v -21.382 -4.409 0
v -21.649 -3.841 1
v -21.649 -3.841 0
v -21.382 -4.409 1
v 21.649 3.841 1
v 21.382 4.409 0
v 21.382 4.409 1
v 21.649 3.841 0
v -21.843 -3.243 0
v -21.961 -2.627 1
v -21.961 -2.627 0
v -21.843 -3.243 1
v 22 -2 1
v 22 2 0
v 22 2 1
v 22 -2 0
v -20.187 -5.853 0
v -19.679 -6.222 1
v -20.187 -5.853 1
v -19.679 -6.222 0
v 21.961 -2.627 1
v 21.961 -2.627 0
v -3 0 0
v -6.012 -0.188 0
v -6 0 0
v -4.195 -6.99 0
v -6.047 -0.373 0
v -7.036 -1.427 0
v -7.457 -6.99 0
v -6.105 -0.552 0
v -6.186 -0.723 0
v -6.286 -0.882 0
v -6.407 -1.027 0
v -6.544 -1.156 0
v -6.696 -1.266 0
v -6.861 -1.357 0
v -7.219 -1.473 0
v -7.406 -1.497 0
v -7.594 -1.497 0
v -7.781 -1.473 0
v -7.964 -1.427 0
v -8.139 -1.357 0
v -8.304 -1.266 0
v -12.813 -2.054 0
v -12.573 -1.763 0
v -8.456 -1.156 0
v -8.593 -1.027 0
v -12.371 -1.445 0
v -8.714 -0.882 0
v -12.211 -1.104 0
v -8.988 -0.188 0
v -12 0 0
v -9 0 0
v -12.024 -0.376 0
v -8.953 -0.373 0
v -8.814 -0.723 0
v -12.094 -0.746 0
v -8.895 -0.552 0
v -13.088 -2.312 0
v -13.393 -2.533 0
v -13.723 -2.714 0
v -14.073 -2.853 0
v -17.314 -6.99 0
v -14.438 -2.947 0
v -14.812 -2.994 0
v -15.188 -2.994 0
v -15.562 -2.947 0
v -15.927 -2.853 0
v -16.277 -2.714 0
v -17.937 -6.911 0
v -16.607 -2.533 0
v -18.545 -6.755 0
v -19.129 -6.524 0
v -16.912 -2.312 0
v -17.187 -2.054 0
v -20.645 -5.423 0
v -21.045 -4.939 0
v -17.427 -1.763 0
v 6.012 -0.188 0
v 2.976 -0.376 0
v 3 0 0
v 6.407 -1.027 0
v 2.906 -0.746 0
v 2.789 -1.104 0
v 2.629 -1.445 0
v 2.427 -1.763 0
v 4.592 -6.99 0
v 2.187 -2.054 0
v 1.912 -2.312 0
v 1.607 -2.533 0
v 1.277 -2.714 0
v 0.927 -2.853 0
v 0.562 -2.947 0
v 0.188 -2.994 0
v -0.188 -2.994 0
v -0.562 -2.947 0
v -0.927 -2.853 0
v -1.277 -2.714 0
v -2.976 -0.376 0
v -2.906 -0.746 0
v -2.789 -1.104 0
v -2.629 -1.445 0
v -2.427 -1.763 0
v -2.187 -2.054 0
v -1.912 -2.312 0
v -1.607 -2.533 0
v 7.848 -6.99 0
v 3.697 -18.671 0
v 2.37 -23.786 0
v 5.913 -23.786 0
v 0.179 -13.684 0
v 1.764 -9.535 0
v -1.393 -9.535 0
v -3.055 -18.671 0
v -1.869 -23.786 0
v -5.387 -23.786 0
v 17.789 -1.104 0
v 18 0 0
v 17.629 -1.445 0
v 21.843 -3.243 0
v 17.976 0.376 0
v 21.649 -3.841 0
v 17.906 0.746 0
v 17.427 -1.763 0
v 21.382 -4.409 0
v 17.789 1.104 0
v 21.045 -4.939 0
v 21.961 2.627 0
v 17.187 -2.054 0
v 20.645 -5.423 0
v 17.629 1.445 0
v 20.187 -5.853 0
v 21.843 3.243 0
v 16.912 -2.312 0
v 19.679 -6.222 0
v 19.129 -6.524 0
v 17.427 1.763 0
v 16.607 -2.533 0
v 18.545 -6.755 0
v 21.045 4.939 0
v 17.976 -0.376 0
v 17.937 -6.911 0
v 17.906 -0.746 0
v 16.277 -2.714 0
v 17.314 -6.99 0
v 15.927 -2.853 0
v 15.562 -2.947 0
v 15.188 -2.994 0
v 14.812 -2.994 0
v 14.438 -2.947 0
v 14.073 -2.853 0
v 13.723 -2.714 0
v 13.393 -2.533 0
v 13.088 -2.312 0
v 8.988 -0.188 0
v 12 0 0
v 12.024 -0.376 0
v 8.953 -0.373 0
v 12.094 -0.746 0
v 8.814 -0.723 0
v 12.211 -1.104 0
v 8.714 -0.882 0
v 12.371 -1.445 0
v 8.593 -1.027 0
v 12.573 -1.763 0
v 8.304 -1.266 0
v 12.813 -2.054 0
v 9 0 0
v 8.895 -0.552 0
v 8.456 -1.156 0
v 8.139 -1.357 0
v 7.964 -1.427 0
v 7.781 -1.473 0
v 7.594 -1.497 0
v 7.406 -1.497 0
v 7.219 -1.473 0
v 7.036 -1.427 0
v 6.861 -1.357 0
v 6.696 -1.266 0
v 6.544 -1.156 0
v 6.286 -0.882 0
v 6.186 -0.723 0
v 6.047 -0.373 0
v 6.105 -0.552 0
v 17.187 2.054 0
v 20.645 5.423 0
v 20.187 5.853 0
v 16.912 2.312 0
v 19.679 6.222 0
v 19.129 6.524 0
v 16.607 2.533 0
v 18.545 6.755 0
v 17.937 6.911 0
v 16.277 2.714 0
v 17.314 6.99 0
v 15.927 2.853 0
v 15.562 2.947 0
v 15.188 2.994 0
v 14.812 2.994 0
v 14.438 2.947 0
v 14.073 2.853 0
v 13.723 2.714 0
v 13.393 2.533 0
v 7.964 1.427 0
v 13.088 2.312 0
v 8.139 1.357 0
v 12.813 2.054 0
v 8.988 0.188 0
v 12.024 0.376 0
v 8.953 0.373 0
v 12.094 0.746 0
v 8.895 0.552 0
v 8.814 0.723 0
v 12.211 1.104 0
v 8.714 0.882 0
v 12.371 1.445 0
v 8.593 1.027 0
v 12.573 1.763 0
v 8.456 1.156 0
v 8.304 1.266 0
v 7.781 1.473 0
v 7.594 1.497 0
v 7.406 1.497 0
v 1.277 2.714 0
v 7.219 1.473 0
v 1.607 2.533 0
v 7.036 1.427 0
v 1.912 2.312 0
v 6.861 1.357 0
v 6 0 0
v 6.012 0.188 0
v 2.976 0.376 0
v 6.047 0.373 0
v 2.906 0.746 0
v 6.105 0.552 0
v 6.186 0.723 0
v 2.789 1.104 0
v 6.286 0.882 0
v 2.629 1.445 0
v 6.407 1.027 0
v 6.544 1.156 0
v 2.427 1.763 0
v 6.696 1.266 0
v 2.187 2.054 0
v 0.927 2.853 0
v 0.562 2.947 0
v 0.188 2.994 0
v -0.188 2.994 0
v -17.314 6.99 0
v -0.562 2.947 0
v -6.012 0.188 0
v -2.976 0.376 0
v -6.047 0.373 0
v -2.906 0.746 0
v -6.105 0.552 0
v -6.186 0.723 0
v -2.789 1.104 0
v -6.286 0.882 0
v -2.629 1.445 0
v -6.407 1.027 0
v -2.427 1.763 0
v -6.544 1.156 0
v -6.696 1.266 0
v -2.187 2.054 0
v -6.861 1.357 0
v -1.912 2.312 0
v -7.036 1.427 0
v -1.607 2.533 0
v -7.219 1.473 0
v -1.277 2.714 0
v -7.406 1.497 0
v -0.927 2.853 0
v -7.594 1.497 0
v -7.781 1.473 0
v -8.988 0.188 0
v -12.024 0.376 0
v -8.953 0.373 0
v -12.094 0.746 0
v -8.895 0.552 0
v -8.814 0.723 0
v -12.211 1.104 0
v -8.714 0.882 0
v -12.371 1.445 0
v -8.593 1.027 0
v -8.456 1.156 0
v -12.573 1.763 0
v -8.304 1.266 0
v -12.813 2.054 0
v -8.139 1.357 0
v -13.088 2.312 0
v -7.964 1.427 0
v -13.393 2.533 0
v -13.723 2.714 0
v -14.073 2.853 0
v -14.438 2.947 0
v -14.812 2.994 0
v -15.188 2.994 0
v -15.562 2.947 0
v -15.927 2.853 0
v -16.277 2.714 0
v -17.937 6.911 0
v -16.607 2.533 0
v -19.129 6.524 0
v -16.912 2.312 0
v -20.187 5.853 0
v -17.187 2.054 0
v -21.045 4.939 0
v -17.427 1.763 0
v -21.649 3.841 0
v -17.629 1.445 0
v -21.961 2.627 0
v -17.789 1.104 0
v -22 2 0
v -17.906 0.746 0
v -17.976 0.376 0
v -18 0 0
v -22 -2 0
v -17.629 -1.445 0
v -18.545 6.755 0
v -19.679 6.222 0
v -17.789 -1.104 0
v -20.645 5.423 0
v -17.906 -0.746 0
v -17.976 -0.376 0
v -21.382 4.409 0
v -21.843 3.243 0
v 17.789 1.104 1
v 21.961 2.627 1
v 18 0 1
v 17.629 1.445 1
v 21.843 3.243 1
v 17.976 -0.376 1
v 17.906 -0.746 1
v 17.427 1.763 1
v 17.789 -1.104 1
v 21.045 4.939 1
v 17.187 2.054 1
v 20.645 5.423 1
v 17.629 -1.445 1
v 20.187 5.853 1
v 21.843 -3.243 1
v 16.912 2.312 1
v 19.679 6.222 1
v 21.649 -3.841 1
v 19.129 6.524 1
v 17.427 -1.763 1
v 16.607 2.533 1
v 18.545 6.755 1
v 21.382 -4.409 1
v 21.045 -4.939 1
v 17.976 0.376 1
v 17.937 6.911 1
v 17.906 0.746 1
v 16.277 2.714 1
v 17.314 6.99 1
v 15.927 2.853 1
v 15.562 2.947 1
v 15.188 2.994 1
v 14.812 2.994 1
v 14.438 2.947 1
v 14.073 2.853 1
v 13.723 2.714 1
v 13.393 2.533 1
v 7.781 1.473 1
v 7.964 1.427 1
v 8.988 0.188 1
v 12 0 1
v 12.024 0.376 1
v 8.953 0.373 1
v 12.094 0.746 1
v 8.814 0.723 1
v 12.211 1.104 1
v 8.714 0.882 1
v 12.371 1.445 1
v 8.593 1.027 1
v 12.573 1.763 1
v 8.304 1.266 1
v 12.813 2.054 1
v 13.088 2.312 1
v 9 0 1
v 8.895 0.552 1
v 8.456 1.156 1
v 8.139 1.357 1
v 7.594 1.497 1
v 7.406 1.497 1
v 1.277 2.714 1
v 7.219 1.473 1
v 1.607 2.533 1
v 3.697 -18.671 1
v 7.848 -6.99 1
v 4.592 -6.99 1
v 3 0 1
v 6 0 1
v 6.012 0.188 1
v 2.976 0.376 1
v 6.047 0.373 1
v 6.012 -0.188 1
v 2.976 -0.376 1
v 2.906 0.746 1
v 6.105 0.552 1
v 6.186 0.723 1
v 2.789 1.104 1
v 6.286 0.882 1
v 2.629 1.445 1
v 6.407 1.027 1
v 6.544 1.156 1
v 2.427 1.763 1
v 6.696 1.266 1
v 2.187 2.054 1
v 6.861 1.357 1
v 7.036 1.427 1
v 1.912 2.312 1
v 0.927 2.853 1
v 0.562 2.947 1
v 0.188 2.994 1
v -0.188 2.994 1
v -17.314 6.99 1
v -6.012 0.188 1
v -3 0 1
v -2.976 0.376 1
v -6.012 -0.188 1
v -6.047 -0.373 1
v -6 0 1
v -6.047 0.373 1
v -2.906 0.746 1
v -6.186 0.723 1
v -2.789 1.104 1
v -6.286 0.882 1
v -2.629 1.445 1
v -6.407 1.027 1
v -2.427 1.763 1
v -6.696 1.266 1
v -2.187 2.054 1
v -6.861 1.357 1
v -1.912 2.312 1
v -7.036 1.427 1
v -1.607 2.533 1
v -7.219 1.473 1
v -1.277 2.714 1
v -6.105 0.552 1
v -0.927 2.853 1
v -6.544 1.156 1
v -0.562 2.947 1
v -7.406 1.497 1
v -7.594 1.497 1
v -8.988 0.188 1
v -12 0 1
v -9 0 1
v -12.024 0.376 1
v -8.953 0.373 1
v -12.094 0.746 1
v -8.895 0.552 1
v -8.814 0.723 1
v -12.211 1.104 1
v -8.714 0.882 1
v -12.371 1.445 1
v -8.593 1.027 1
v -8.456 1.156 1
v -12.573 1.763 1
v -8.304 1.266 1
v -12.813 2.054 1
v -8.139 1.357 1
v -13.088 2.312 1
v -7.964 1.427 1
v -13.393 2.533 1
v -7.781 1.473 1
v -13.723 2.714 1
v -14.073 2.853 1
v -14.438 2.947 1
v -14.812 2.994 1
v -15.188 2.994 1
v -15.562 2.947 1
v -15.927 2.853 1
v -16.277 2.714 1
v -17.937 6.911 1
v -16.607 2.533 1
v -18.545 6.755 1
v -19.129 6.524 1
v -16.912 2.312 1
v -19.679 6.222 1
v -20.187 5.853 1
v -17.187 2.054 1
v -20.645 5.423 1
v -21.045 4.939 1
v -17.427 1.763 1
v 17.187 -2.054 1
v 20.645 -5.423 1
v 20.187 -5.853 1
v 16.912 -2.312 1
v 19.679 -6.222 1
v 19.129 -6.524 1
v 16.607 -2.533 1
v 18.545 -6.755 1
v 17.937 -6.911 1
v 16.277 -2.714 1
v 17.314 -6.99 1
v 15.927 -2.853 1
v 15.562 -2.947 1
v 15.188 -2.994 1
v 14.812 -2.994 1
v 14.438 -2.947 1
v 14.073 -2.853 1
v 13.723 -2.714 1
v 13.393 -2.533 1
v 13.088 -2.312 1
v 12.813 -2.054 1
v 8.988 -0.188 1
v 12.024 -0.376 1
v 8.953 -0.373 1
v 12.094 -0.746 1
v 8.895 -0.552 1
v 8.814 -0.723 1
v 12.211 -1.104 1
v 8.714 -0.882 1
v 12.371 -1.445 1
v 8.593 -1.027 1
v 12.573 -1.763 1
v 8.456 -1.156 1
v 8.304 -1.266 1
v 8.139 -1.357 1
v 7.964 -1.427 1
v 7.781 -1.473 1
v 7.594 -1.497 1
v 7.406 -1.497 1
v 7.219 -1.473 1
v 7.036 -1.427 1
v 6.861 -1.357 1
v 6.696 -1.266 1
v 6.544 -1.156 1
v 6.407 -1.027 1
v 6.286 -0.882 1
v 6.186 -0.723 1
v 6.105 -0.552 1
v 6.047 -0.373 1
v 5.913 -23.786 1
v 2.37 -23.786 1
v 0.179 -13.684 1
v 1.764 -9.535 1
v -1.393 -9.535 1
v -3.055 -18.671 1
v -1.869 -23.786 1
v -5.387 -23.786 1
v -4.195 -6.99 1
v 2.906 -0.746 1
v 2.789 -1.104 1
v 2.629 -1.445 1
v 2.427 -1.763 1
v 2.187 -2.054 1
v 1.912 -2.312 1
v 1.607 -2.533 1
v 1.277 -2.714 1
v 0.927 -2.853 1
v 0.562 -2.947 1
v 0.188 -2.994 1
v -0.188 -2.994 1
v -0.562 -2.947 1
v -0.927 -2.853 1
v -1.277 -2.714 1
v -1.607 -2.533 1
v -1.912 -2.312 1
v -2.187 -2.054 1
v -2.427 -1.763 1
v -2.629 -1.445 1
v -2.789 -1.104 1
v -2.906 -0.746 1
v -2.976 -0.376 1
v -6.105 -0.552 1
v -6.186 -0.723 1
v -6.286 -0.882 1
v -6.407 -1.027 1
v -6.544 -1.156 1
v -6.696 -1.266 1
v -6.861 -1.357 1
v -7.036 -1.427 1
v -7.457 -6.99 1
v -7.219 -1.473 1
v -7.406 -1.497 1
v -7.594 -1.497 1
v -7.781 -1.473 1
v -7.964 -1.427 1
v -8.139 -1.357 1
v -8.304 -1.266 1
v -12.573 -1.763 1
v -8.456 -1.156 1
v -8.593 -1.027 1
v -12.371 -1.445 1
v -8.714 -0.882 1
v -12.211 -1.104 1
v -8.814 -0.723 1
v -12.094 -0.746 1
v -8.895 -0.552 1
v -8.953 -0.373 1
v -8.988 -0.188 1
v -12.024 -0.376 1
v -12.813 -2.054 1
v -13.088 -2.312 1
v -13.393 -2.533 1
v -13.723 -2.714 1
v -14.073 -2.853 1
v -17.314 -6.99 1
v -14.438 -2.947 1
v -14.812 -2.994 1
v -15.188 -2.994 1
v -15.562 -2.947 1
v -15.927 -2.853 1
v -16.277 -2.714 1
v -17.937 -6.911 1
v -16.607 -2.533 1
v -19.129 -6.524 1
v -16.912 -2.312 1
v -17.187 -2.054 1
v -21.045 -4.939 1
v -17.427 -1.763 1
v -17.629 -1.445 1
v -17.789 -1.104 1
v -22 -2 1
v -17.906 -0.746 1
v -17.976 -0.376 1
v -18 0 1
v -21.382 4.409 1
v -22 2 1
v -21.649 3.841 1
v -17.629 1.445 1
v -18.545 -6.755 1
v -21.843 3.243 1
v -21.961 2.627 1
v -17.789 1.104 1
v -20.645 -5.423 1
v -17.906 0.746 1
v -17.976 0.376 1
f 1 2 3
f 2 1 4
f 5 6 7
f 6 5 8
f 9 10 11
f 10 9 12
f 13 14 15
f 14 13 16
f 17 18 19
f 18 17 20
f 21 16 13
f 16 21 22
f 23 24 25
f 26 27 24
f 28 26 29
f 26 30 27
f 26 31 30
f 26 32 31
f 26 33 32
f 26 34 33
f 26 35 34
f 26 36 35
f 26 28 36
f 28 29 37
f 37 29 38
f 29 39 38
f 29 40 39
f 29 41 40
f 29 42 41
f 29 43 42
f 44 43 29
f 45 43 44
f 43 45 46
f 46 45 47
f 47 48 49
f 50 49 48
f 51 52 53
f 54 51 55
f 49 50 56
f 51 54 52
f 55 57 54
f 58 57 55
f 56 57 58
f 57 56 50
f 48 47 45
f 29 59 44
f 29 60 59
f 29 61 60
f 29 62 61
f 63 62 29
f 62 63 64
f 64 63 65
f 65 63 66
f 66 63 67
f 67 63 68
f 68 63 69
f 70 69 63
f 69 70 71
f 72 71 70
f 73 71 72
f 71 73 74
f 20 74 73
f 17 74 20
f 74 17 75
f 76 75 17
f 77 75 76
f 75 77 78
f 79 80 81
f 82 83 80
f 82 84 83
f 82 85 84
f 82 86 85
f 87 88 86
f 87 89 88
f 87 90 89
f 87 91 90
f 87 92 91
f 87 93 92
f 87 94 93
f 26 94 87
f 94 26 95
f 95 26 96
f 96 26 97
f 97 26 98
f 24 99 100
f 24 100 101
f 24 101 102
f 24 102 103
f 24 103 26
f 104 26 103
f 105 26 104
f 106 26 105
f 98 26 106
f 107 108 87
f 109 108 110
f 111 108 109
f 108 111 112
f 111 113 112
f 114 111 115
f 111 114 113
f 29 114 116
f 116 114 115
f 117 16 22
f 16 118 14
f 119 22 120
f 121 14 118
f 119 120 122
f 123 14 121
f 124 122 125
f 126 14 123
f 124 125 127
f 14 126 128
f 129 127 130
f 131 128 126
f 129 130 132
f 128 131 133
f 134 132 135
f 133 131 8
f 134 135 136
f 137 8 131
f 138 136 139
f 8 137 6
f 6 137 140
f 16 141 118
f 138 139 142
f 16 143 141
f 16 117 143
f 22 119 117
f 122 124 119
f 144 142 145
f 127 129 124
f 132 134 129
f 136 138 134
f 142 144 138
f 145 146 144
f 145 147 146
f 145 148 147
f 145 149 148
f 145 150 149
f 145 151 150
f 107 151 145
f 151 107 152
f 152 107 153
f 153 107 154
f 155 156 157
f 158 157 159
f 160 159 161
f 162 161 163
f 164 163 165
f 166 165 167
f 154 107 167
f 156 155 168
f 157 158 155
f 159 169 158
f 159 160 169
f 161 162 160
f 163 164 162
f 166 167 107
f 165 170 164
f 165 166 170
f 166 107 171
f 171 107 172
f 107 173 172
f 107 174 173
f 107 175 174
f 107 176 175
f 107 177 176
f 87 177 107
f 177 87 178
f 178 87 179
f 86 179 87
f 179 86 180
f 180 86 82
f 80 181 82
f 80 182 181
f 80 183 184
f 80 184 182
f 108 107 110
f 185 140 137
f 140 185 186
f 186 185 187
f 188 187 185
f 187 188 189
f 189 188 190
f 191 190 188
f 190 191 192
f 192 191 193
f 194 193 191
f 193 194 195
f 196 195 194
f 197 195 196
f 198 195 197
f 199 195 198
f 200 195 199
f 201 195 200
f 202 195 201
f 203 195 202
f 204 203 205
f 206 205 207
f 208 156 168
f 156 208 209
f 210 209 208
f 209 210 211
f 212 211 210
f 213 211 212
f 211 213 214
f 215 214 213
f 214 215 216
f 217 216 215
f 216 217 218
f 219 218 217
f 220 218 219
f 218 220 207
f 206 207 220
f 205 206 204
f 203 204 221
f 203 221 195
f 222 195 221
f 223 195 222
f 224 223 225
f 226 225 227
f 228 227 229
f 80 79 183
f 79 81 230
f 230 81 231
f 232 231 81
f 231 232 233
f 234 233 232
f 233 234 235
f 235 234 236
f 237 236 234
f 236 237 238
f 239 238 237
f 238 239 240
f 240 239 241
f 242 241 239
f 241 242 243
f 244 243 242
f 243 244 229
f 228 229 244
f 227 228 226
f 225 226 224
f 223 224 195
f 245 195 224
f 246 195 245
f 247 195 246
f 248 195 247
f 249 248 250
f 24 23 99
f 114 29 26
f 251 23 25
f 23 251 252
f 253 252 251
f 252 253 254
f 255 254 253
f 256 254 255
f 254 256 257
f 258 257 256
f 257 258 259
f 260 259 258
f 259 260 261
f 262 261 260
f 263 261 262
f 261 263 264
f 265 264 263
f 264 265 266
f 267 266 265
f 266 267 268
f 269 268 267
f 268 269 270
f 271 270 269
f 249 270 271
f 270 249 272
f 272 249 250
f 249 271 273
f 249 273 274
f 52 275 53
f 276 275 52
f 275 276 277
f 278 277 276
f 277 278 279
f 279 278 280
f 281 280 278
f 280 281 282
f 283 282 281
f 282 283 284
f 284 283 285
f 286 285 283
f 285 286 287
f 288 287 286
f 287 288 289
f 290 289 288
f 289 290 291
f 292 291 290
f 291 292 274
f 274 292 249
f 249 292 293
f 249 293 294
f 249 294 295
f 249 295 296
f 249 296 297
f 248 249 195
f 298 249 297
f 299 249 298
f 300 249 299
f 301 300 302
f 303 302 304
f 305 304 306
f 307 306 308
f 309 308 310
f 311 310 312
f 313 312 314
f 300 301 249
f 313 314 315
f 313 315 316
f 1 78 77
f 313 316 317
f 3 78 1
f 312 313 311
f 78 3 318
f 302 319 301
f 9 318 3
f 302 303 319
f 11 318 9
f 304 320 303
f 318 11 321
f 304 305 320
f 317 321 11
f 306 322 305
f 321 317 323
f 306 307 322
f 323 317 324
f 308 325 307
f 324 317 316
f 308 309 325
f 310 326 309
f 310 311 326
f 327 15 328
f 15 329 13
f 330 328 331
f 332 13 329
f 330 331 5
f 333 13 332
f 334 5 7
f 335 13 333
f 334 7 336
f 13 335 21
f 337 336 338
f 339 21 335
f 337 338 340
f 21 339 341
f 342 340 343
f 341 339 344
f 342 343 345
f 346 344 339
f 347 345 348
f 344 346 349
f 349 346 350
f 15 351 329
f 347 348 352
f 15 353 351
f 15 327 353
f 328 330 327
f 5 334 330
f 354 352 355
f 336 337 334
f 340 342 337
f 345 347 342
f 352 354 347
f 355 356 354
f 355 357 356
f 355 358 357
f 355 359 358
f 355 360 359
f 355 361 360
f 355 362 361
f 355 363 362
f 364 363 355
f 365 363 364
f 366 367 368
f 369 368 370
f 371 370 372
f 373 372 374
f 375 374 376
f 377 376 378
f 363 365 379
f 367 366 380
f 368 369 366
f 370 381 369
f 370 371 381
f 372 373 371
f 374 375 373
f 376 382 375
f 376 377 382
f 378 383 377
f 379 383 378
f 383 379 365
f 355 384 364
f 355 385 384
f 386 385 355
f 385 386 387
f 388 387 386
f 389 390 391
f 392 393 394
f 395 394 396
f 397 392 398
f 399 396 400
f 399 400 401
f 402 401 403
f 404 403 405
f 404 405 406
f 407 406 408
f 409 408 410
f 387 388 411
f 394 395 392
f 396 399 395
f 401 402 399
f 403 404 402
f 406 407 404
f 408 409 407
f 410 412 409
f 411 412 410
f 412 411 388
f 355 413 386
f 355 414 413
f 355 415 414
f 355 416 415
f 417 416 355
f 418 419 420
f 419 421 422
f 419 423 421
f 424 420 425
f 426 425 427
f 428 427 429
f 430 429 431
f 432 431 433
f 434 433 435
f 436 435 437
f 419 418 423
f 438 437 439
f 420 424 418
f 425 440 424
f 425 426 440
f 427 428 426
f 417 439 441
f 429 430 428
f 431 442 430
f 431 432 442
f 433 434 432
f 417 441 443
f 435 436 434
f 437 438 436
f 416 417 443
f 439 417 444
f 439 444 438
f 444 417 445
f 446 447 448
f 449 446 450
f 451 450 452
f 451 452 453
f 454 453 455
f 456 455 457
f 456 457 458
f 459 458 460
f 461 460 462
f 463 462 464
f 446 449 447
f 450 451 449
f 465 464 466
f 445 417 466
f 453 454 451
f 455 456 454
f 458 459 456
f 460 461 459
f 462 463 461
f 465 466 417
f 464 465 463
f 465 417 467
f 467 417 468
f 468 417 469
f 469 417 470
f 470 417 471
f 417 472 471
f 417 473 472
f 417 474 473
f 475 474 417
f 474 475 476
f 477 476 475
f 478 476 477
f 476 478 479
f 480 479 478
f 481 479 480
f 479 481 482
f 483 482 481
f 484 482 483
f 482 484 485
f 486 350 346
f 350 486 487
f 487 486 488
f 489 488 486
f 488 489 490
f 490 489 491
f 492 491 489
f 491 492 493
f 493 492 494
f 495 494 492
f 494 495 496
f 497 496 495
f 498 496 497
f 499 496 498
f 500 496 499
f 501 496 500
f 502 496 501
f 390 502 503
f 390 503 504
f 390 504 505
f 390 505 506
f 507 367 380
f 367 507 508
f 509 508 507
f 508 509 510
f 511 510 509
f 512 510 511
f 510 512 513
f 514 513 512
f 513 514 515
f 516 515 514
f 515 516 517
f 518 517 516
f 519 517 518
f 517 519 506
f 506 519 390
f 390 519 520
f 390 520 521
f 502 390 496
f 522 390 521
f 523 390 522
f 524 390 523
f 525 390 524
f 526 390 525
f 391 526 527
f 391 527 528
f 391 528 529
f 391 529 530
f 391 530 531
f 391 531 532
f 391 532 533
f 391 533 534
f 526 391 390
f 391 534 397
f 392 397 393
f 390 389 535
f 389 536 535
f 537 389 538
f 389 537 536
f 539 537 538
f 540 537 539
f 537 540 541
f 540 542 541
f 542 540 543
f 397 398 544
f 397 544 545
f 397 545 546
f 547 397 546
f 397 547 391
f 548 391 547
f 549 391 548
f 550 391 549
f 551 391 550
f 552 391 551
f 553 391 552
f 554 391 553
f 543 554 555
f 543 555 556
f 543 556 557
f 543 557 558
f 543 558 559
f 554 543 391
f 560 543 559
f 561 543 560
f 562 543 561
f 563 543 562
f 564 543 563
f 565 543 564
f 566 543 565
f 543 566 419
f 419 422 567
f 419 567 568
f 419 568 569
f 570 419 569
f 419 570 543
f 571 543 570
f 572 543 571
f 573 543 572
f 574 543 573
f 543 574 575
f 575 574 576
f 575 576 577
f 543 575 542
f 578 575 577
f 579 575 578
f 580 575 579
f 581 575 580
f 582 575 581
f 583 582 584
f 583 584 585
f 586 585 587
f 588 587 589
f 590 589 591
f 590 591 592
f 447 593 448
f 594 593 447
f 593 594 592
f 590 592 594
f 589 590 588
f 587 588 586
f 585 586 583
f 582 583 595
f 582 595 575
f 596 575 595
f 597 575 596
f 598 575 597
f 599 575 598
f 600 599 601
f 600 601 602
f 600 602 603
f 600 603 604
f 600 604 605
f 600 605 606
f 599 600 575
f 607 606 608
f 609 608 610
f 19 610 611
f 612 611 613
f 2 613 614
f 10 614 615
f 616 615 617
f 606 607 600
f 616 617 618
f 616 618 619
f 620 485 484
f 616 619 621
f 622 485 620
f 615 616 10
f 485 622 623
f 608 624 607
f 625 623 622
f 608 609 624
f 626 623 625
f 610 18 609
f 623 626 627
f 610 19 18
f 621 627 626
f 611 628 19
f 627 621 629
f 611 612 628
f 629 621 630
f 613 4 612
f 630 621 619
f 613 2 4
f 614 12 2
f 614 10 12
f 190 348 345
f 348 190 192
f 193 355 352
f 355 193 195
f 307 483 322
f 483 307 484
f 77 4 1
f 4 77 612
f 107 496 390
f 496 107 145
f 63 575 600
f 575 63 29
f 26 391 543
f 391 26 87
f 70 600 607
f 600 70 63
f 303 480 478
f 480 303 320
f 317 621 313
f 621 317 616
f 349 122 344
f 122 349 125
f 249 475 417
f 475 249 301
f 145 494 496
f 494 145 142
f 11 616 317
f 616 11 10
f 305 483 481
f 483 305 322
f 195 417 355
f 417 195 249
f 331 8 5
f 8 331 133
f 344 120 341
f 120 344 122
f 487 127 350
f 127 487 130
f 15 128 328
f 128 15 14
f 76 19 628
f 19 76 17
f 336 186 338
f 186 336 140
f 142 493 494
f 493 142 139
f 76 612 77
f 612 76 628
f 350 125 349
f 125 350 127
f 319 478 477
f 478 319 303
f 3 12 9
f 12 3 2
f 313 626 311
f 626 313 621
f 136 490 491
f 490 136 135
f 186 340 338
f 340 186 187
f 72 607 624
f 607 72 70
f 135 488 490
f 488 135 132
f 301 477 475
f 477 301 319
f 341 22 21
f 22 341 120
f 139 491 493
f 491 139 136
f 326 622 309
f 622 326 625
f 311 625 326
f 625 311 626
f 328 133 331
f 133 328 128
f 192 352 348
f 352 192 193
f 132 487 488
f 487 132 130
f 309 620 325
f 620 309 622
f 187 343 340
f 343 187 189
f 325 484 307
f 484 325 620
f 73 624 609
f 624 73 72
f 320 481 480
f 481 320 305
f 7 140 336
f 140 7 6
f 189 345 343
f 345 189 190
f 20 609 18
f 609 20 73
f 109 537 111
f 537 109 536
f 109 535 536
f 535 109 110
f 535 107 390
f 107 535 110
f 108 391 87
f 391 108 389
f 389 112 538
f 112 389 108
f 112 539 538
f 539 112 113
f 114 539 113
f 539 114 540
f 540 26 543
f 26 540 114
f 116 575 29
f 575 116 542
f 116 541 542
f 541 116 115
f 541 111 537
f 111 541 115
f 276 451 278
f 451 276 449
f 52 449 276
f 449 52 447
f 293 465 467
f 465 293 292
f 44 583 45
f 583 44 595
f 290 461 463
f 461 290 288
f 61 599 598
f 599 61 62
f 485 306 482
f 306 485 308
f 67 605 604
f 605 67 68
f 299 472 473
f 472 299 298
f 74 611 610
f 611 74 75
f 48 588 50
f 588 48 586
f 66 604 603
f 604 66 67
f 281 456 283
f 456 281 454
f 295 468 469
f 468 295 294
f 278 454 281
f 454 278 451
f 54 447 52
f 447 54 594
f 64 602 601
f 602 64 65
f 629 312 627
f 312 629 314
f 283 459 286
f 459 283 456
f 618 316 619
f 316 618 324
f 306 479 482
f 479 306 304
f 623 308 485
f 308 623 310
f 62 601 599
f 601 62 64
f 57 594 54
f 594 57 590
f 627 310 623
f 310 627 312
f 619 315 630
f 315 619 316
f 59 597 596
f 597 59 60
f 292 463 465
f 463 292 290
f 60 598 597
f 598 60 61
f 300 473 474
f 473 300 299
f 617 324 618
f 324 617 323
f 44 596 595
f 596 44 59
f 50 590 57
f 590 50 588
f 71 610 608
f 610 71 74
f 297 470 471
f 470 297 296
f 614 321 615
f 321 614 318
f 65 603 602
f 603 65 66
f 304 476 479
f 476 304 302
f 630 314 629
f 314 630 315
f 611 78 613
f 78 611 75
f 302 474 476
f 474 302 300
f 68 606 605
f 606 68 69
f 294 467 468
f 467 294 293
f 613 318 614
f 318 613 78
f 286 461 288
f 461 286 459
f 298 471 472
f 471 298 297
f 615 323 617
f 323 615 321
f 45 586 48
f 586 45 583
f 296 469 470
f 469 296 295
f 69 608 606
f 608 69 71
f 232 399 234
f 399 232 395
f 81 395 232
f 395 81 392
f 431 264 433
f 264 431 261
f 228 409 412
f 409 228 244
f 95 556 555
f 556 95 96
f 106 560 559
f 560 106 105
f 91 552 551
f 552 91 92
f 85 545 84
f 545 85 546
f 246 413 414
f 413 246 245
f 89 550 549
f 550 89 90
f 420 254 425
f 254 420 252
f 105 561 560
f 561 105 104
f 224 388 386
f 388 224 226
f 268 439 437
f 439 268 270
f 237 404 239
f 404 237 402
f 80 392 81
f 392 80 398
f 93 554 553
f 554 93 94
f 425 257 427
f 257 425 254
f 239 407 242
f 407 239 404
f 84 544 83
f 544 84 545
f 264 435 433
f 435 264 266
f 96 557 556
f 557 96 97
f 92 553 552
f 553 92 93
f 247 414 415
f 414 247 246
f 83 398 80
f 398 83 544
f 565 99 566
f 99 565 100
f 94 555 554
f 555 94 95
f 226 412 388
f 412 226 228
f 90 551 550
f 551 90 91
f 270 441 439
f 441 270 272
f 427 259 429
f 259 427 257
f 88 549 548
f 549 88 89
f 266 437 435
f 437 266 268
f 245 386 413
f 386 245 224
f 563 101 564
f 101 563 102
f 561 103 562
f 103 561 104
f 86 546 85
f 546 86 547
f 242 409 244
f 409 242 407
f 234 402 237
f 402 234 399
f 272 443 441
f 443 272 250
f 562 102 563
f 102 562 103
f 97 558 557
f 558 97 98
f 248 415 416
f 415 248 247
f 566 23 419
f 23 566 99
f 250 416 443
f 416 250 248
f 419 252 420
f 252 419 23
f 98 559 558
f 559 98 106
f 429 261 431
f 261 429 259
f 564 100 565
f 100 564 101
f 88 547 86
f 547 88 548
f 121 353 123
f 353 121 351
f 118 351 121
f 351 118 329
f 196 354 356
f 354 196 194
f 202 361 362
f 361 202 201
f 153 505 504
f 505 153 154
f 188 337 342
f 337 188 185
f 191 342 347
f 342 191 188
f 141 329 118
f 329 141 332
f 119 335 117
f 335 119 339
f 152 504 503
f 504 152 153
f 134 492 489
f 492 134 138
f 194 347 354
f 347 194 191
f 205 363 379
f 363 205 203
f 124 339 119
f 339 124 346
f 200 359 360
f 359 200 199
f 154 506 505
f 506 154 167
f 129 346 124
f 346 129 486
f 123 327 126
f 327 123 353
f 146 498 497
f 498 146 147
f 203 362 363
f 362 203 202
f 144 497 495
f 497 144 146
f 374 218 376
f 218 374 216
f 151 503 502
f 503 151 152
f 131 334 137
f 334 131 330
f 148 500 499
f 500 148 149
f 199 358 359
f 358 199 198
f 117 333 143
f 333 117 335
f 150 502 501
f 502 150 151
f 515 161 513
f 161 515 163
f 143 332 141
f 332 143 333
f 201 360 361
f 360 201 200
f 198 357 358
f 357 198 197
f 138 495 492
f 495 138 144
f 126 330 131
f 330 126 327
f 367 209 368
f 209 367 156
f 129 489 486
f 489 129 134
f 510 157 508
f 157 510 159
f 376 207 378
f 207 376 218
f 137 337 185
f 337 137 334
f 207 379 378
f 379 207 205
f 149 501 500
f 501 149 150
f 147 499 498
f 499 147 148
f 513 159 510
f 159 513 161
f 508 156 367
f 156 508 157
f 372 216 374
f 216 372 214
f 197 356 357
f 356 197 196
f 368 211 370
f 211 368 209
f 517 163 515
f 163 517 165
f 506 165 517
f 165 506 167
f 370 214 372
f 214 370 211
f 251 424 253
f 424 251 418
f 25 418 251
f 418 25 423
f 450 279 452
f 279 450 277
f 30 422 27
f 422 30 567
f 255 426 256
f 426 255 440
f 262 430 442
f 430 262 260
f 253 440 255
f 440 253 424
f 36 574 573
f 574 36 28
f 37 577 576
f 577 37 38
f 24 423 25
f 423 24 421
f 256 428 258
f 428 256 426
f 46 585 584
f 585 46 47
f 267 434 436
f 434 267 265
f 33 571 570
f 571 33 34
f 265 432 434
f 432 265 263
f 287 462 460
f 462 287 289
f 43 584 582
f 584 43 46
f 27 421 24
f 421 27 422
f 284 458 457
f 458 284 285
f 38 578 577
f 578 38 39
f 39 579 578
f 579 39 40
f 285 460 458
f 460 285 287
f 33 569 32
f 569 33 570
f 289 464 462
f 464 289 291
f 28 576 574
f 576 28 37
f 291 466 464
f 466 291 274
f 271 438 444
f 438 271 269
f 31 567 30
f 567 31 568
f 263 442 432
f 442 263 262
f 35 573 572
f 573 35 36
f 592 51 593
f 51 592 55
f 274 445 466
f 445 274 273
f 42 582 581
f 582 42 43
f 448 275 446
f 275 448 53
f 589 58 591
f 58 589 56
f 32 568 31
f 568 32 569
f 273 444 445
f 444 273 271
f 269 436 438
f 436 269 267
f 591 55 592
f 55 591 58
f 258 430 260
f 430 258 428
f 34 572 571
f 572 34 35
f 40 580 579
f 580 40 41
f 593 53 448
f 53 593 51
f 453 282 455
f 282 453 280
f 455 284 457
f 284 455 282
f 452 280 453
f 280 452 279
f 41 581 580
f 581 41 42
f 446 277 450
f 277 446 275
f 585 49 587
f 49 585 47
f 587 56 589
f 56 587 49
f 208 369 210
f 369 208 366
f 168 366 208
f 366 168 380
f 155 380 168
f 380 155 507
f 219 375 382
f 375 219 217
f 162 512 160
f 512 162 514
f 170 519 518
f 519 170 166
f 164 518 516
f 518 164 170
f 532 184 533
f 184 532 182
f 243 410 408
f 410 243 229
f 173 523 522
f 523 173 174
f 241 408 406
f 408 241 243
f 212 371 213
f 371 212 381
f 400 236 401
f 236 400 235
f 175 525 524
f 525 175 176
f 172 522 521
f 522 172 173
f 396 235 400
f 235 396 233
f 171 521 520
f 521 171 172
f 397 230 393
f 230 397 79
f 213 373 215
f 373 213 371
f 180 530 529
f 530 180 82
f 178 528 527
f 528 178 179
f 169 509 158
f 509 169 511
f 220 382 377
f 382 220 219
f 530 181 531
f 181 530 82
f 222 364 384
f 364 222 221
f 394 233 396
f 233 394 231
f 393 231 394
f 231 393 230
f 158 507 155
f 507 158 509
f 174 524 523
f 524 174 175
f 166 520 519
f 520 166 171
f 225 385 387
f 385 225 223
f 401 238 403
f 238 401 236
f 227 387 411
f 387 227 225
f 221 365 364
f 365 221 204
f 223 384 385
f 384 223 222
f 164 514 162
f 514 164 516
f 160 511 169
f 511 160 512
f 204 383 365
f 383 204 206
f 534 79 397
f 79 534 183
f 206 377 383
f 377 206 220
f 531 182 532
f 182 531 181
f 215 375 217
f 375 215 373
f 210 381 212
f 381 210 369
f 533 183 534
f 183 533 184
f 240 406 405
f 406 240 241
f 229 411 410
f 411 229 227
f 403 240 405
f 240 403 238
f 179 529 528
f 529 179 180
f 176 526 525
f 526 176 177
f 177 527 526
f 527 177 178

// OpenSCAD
$fn = 50;


difference() {
	union() {
		hull() {
			translate(v = [-17.0000000000, 2.0000000000, 0]) {
				cylinder(h = 1, r = 5);
			}
			translate(v = [17.0000000000, 2.0000000000, 0]) {
				cylinder(h = 1, r = 5);
			}
			translate(v = [-17.0000000000, -2.0000000000, 0]) {
				cylinder(h = 1, r = 5);
			}
			translate(v = [17.0000000000, -2.0000000000, 0]) {
				cylinder(h = 1, r = 5);
			}
		}
		translate(v = [0, -5, 0]) {
			linear_extrude(height = 1) {
				text(font = "DejaVu Sans Mono:style=Bold", halign = "center", size = 19.0000000000, text = "W", valign = "top");
			}
		}
	}
	union() {
		translate(v = [-15.0000000000, 0.0000000000, 0]) {
			translate(v = [0, 0, -100]) {
				cylinder(h = 200, r = 3.0000000000);
			}
		}
		translate(v = [0, 0, -100]) {
			cylinder(h = 200, r = 3.0000000000);
		}
		translate(v = [15.0000000000, 0.0000000000, 0]) {
			translate(v = [0, 0, -100]) {
				cylinder(h = 200, r = 3.0000000000);
			}
		}
		translate(v = [-15.0000000000, 0.0000000000, 0]) {
			translate(v = [0, 0, -100]) {
				cylinder(h = 200, r = 1.5000000000);
			}
		}
		translate(v = [-7.5000000000, 0.0000000000, 0]) {
			translate(v = [0, 0, -100]) {
				cylinder(h = 200, r = 1.5000000000);
			}
		}
		translate(v = [0, 0, -100]) {
			cylinder(h = 200, r = 1.5000000000);
		}
		translate(v = [7.5000000000, 0.0000000000, 0]) {
			translate(v = [0, 0, -100]) {
				cylinder(h = 200, r = 1.5000000000);
			}
		}
		translate(v = [15.0000000000, 0.0000000000, 0]) {
			translate(v = [0, 0, -100]) {
				cylinder(h = 200, r = 1.5000000000);
			}
		}
	}
}
